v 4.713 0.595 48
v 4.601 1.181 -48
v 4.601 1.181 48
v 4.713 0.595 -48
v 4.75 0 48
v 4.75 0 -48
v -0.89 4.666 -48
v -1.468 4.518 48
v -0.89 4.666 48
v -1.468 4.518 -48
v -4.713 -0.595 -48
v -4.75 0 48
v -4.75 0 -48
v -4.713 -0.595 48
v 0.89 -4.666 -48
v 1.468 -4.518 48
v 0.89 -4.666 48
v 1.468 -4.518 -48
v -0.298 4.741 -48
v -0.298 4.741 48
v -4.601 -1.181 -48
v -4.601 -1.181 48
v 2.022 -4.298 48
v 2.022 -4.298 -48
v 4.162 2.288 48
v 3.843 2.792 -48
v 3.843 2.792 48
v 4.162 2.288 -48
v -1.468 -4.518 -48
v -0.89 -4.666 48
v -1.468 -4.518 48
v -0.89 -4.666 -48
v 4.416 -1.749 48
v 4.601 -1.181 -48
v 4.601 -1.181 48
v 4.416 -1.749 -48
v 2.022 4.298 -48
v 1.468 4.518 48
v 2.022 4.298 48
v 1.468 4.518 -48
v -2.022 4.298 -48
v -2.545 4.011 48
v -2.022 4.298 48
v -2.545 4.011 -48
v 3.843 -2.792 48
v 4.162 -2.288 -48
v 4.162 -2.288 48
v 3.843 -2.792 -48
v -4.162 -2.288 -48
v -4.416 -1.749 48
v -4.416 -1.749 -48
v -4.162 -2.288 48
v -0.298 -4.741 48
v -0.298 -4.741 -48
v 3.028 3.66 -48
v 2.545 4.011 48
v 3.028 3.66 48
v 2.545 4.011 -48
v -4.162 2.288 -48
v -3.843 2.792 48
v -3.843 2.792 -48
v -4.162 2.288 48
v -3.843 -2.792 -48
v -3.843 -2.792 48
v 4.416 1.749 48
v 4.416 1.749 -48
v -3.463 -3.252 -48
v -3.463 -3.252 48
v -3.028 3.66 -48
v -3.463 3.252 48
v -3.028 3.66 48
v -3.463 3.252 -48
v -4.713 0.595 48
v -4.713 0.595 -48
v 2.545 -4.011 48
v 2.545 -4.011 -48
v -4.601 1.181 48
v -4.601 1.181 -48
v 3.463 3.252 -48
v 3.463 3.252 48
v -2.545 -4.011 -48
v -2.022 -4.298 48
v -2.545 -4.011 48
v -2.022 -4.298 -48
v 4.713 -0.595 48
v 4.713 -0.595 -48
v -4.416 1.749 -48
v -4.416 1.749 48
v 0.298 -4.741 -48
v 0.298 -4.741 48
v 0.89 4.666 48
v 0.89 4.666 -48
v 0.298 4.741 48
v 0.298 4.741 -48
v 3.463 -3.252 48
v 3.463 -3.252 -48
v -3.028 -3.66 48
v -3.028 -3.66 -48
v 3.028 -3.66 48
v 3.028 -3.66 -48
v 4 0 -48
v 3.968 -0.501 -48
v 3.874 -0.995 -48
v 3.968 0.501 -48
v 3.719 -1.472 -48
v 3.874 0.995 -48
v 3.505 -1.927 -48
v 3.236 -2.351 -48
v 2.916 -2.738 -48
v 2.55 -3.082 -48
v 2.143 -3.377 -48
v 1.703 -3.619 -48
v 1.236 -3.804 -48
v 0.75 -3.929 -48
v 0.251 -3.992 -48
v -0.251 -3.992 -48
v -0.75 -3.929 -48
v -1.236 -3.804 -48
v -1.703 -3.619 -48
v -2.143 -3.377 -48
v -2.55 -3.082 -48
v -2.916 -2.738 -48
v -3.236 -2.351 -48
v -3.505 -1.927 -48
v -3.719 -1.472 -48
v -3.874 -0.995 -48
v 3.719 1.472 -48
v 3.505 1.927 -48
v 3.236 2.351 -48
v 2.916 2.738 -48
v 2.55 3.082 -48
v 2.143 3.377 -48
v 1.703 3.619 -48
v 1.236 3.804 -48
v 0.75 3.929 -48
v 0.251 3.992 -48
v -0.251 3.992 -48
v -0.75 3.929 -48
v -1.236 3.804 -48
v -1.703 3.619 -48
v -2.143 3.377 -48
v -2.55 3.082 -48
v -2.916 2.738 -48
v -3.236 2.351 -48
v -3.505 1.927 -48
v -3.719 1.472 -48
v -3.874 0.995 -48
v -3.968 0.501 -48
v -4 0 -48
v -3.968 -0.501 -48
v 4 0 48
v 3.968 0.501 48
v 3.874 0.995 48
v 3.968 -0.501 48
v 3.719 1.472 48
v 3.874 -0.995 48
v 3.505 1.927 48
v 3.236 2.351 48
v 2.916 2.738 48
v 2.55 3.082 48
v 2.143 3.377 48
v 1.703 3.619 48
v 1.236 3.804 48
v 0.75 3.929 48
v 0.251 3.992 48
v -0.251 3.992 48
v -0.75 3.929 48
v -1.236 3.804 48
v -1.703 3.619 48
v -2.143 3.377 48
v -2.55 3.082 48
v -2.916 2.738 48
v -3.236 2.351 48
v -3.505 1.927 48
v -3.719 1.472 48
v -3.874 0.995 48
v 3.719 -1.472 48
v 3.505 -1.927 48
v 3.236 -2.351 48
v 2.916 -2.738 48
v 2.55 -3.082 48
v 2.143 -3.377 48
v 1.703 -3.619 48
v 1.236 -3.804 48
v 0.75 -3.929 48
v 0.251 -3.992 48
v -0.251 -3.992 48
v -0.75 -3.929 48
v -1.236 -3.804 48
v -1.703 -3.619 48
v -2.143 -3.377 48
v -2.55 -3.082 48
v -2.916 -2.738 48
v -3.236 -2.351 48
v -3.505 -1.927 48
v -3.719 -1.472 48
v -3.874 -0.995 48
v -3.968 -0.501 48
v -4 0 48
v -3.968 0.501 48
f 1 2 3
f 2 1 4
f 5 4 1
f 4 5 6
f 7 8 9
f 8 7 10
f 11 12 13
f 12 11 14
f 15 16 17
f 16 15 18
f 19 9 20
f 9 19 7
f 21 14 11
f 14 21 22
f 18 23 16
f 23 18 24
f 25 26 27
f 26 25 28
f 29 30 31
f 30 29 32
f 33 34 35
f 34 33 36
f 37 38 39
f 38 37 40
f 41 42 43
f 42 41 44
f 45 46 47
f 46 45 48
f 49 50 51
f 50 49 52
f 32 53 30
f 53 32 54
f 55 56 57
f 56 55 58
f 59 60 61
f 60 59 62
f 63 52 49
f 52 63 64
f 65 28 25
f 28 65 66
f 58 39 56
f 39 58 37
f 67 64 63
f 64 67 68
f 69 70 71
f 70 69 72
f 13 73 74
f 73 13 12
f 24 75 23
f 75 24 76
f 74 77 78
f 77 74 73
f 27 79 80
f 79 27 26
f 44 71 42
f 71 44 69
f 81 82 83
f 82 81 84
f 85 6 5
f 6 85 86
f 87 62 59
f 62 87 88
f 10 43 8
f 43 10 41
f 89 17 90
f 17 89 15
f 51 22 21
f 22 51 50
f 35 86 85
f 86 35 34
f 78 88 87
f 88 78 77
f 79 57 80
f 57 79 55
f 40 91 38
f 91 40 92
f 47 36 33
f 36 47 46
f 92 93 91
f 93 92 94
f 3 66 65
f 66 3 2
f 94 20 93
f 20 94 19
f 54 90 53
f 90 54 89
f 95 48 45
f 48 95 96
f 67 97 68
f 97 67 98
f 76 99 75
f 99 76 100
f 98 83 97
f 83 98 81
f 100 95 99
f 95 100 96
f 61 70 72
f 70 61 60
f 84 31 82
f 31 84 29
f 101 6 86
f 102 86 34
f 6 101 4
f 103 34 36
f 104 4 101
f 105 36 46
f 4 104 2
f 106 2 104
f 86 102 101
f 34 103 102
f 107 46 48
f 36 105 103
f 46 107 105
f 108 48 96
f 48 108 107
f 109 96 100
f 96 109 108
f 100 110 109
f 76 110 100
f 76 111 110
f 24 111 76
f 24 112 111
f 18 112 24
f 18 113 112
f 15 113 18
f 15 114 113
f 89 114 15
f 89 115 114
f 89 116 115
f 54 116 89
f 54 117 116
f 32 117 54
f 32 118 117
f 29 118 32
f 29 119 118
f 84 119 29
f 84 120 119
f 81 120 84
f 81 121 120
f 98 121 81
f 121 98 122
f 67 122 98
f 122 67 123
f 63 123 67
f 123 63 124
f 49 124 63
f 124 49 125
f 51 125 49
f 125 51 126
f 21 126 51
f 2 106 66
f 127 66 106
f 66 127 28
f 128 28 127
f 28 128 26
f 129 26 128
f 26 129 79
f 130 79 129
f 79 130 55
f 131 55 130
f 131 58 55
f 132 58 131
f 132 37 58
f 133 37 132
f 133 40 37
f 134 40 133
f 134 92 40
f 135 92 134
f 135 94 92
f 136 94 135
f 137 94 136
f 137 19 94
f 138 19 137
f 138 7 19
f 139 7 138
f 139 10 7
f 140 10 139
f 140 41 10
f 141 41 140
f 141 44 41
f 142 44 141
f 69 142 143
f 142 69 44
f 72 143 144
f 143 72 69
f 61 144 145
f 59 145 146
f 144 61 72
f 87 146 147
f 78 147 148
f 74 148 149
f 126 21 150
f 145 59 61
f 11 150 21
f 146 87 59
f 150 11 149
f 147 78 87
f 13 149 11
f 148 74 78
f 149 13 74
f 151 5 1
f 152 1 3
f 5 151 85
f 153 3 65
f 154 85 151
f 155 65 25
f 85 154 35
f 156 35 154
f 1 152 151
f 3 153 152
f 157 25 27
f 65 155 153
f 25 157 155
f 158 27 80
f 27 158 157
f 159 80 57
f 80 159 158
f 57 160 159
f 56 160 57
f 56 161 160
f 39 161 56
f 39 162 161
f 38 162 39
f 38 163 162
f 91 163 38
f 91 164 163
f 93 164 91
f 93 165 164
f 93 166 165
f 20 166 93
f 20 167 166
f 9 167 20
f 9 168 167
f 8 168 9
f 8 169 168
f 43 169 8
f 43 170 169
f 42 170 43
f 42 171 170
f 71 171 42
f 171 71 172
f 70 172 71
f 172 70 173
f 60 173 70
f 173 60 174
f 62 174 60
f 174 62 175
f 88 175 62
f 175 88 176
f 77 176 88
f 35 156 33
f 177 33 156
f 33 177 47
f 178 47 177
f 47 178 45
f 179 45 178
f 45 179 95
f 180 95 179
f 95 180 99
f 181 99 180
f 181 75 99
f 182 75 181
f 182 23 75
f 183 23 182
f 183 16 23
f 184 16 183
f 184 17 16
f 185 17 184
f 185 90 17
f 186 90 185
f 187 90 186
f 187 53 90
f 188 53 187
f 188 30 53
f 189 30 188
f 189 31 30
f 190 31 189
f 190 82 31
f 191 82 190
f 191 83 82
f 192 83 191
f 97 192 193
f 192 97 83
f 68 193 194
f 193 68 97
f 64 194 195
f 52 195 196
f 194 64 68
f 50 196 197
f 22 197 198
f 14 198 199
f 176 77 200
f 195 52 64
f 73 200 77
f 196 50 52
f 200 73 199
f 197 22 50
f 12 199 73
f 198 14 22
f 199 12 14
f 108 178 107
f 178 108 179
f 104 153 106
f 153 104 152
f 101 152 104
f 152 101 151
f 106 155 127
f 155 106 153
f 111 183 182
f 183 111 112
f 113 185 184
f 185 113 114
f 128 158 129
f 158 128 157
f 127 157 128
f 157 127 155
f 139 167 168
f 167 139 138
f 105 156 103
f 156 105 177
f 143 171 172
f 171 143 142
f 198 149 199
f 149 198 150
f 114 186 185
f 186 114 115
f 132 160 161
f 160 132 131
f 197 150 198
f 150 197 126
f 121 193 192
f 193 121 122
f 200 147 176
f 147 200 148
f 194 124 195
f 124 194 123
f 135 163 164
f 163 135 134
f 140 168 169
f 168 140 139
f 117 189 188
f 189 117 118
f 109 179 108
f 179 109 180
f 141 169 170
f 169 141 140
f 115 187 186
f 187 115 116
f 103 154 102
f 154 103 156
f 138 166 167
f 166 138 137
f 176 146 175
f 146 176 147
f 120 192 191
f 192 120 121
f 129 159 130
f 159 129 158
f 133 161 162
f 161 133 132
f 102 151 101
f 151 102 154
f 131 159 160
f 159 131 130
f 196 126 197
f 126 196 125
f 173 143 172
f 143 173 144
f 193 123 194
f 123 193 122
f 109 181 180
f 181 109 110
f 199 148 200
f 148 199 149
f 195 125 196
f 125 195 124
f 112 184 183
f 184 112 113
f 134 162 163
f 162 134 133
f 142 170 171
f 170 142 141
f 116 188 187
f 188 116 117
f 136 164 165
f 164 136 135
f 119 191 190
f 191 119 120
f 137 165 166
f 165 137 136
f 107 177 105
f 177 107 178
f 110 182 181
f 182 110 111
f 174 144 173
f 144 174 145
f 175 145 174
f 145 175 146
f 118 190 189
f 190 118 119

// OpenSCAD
$fn = 50;


difference() {
	union() {
		translate(v = [0, 0, -48.0000000000]) {
			cylinder(h = 96, r = 4.7500000000);
		}
	}
	union() {
		translate(v = [0, 0, -100.0000000000]) {
			cylinder(h = 200, r = 4.0000000000);
		}
	}
}
